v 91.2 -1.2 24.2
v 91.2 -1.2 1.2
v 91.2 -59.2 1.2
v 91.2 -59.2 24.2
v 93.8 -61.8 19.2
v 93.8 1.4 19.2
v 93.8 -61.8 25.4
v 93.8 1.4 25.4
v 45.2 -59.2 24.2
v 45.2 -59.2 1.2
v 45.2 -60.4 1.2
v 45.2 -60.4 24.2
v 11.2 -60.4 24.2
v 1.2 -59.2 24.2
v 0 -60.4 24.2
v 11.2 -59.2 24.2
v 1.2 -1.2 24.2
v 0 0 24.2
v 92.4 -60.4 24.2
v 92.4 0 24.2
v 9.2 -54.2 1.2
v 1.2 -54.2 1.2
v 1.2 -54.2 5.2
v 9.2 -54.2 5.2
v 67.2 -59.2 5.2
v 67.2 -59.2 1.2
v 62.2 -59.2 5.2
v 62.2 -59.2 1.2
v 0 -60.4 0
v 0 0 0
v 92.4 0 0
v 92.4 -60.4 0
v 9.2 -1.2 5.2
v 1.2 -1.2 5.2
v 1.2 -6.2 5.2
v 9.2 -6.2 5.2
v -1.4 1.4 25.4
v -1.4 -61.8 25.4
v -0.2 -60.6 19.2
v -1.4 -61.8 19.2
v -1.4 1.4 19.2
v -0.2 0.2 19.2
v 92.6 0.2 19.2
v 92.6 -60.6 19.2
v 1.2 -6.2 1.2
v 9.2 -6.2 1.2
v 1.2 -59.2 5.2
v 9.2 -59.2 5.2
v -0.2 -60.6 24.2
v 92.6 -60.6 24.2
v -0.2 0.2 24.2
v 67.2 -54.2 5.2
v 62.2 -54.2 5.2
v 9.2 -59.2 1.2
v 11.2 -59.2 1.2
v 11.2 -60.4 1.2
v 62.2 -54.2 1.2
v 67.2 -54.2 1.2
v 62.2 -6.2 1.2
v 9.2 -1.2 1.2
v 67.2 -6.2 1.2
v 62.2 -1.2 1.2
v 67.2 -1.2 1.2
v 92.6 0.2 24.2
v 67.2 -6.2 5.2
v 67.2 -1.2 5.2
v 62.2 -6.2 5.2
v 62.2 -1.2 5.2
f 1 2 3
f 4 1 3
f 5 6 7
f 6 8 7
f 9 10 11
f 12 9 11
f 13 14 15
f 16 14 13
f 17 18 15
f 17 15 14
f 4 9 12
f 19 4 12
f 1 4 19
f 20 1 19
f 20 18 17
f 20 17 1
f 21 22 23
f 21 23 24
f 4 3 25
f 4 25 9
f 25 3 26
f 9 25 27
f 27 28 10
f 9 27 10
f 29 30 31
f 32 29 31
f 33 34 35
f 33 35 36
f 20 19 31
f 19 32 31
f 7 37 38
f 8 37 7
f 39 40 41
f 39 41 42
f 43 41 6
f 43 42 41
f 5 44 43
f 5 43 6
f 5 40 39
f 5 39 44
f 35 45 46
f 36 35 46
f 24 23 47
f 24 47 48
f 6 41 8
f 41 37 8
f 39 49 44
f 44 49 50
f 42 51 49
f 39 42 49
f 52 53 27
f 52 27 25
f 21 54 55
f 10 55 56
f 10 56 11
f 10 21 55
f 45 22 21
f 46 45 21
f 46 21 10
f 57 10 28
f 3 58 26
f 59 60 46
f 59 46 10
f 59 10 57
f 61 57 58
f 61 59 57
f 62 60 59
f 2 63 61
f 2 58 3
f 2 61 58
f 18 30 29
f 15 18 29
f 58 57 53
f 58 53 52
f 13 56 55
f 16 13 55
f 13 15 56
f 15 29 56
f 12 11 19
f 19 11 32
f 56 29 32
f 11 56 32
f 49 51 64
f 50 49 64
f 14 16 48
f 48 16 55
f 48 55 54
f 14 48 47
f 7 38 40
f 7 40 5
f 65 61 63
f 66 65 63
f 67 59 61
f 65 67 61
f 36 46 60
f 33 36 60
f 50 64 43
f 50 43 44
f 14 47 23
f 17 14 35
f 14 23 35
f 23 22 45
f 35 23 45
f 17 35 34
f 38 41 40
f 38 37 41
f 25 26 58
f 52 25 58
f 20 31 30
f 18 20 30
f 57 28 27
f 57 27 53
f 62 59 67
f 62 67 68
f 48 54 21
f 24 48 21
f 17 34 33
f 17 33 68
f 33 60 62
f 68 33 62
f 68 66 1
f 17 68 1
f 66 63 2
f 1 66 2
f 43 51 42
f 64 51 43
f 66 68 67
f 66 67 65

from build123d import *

# Parameters (mm, degrees)
F0_W     = 92.4
F0_H     = 60.4
F1_DEPTH = 1.2
F3_DEPTH = 23
F4_W     = 8
F4_H     = 5
F4_W_2   = 5
F5_DEPTH = 4
F6_W     = 95.2
F6_H     = 63.2
F7_DEPTH = 1.2
F8_W     = 95.2
F8_H     = 63.2
F8_W_2   = 92.8
F8_H_2   = 60.8
F9_DEPTH = 5


with BuildPart() as f1:
    # F0 (on Top) → F1 (new body)
    with BuildSketch(Plane.XY):
        with Locations((46.2, -30.2)):
            Rectangle(F0_W, F0_H)
    extrude(amount=F1_DEPTH)

    # F2 (on face) → F3 (join)
    with BuildSketch(Plane.XY.offset(1.2)):
        Polygon((0, 0), (0, -60.4), (11.2, -60.4), (11.2, -59.2), (1.2, -59.2), (1.2, -1.2), (91.2, -1.2), (91.2, -59.2), (45.2, -59.2), (45.2, -60.4), (92.4, -60.4), (92.4, 0), align=None)
    extrude(amount=F3_DEPTH)

    # F4 (on face) → F5 (join)
    with BuildSketch(Plane.XY.offset(1.2)):
        with Locations((5.2, -3.7)):
            Rectangle(F4_W, F4_H)
        with Locations((5.2, -56.7)):
            Rectangle(F4_W, F4_H)
        with Locations((64.7, -56.7)):
            Rectangle(F4_W_2, F4_H)
        with Locations((64.7, -3.7)):
            Rectangle(F4_W_2, F4_H)
    extrude(amount=F5_DEPTH)


with BuildPart() as f7:
    # F6 (on face) → F7 (new body)
    with BuildSketch(Plane.XY.offset(24.2)):
        with Locations((46.2, -30.2)):
            Rectangle(F6_W, F6_H)
    extrude(amount=F7_DEPTH)

    # F8 (on face) → F9 (join)
    with BuildSketch(Plane(origin=(0, 0, 24.2), x_dir=(1, 0, 0), z_dir=(0, 0, -1))):
        with Locations((46.2, 30.2)):
            Rectangle(F8_W, F8_H)
        with Locations((46.2, 30.2)):
            Rectangle(F8_W_2, F8_H_2, mode=Mode.SUBTRACT)
    extrude(amount=F9_DEPTH)


solid = Compound([f1.part, f7.part])
